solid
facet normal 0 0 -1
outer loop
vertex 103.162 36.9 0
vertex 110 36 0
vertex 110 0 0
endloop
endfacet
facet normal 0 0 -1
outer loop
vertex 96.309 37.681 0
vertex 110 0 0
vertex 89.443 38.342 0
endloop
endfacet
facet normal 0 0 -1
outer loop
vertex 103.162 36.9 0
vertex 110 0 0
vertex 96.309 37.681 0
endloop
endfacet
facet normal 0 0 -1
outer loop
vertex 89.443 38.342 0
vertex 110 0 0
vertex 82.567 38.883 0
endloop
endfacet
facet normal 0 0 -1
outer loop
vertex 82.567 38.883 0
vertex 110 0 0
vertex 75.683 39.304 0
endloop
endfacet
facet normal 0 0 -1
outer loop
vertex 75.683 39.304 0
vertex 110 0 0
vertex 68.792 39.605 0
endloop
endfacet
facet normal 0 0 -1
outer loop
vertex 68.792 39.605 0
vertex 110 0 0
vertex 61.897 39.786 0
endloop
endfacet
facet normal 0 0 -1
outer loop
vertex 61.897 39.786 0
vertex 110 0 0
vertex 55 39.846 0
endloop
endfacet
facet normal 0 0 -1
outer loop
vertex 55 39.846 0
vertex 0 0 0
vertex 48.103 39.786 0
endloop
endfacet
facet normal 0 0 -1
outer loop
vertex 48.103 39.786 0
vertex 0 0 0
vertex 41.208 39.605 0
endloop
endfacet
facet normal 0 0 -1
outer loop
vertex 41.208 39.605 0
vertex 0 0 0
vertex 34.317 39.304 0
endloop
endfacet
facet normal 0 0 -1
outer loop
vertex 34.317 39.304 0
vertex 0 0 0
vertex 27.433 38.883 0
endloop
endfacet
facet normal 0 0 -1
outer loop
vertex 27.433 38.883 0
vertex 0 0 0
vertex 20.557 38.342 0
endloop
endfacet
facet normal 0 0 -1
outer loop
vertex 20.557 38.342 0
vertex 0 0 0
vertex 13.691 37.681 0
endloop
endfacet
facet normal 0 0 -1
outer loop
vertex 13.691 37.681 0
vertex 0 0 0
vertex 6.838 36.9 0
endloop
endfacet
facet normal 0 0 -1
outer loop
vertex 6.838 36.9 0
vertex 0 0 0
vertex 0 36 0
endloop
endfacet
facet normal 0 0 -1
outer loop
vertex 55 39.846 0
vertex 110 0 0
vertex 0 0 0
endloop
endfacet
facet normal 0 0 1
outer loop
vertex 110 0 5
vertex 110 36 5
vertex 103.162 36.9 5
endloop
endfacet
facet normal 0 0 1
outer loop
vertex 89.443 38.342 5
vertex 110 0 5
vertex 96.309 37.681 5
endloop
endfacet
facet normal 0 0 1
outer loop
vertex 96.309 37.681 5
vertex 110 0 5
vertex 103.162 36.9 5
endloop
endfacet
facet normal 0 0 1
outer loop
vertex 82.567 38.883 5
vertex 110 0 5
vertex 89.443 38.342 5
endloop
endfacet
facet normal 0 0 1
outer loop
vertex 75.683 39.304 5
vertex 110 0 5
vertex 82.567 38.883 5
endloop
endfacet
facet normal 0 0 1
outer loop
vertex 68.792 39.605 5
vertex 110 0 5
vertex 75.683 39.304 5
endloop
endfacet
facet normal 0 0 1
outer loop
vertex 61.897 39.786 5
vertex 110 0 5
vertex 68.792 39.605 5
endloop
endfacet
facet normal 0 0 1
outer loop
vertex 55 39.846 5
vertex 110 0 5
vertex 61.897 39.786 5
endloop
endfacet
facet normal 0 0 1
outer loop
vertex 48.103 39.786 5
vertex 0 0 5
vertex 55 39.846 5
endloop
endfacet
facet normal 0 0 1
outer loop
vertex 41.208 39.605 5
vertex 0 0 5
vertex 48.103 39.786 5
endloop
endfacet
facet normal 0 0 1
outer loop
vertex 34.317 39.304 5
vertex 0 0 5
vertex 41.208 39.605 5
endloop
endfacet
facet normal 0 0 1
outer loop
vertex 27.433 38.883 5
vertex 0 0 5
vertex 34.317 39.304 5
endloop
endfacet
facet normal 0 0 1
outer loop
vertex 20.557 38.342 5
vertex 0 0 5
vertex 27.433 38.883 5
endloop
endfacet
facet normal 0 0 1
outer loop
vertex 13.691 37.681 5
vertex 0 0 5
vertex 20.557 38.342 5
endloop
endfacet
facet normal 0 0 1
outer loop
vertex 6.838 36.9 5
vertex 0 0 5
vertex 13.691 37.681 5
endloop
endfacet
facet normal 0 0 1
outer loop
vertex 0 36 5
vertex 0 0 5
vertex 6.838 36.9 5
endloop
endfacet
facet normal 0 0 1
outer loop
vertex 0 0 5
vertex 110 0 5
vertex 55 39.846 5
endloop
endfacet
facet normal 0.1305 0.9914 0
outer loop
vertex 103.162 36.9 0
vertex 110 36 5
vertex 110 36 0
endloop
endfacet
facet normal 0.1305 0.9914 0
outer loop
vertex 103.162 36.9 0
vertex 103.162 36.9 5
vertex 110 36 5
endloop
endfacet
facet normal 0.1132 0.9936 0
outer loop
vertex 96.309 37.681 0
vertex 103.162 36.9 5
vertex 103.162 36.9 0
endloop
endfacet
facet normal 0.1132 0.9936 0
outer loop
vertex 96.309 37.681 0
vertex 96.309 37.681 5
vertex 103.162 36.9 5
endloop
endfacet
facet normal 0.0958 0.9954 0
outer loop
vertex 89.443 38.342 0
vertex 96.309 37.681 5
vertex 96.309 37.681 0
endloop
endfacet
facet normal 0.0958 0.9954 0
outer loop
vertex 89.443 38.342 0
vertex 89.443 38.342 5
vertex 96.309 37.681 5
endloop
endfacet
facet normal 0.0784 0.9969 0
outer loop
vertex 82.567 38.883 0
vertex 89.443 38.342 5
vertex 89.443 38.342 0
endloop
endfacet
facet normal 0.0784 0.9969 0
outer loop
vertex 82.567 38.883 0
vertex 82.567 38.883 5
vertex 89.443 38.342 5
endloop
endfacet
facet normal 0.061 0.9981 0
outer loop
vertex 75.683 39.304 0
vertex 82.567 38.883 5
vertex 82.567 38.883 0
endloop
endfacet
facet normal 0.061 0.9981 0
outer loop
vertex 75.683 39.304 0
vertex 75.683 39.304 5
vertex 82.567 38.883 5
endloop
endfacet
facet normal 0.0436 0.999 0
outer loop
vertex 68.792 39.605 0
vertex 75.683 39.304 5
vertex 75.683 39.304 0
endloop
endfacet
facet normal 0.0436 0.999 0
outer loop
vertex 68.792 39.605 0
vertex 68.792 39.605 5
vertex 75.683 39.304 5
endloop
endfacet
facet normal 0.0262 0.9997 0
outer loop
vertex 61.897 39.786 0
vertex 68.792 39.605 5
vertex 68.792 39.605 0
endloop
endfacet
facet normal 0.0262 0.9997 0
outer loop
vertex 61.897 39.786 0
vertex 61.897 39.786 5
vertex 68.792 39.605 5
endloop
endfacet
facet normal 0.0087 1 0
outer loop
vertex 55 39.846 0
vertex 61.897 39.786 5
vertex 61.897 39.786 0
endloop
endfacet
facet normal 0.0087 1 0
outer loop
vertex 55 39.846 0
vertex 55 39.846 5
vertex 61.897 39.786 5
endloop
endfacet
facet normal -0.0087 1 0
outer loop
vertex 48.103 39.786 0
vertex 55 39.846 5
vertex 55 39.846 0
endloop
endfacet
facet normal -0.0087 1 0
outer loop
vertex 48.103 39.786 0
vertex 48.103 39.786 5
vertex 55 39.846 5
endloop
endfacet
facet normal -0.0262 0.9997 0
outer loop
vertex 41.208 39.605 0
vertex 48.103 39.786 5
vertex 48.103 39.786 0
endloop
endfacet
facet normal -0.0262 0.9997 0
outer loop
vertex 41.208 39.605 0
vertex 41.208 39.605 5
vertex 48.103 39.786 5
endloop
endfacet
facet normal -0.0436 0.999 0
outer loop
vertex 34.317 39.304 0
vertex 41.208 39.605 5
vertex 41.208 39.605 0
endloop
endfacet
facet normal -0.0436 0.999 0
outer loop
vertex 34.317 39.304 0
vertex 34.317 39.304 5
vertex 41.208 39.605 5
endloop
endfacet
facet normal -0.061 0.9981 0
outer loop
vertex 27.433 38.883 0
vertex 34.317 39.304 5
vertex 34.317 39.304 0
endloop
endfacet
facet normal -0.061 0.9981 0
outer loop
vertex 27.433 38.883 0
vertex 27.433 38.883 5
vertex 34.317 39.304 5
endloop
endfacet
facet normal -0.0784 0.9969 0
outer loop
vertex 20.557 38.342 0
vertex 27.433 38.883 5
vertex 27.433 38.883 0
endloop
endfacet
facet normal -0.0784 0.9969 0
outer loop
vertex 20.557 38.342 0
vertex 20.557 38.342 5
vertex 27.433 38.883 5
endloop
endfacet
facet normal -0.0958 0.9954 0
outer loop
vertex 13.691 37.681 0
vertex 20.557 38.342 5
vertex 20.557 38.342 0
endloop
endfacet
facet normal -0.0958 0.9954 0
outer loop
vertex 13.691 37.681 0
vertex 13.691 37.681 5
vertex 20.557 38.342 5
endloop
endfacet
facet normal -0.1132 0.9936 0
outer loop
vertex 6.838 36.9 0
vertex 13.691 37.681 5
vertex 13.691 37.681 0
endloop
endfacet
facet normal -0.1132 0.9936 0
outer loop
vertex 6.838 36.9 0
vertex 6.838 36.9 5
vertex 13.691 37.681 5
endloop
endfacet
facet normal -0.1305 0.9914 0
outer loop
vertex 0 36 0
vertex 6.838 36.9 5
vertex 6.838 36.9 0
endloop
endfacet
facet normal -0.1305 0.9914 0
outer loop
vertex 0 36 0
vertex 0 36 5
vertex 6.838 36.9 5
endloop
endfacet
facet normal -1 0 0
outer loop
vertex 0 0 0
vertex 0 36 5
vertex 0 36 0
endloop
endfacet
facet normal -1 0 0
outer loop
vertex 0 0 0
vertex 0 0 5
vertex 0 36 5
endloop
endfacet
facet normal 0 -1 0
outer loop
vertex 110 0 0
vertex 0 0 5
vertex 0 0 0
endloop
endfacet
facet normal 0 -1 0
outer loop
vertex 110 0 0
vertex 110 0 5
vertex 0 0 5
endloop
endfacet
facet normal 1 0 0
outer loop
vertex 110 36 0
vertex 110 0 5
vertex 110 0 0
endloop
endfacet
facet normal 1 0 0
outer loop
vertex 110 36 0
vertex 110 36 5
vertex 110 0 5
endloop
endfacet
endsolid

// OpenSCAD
$fn = 32;

// ----------------------------------------------------------------------
// Arc profile plate: crown, 19 points
// ----------------------------------------------------------------------

// --- parameters (mm) ---
bar_l = 110;              // bar length, X
bar_w = 36;               // bar height at the ends, Y
arc_r = 395.19;           // radius of the crown arc
arc_angle = 16;           // crown arc angle, degrees
crown_rise = 3.85;        // rise of the crown over the ends
arc_step = 1;             // sampling step of the crown arc, degrees
plate_t = 5;              // plate thickness, Z

bbox_y = bar_w + crown_rise;  // full height with the crown

profile = [[110, 36], [103.162, 36.9], [96.309, 37.681], [89.443, 38.342], [82.567, 38.883], [75.683, 39.304], [68.792, 39.605], [61.897, 39.786], [55, 39.846], [48.103, 39.786], [41.208, 39.605], [34.317, 39.304], [27.433, 38.883], [20.557, 38.342], [13.691, 37.681], [6.838, 36.9], [0, 36], [0, 0], [110, 0]];  // primary outline, 19 points, counter clockwise

// --- the one profile operation ---
linear_extrude(height = plate_t) polygon(points = profile);
